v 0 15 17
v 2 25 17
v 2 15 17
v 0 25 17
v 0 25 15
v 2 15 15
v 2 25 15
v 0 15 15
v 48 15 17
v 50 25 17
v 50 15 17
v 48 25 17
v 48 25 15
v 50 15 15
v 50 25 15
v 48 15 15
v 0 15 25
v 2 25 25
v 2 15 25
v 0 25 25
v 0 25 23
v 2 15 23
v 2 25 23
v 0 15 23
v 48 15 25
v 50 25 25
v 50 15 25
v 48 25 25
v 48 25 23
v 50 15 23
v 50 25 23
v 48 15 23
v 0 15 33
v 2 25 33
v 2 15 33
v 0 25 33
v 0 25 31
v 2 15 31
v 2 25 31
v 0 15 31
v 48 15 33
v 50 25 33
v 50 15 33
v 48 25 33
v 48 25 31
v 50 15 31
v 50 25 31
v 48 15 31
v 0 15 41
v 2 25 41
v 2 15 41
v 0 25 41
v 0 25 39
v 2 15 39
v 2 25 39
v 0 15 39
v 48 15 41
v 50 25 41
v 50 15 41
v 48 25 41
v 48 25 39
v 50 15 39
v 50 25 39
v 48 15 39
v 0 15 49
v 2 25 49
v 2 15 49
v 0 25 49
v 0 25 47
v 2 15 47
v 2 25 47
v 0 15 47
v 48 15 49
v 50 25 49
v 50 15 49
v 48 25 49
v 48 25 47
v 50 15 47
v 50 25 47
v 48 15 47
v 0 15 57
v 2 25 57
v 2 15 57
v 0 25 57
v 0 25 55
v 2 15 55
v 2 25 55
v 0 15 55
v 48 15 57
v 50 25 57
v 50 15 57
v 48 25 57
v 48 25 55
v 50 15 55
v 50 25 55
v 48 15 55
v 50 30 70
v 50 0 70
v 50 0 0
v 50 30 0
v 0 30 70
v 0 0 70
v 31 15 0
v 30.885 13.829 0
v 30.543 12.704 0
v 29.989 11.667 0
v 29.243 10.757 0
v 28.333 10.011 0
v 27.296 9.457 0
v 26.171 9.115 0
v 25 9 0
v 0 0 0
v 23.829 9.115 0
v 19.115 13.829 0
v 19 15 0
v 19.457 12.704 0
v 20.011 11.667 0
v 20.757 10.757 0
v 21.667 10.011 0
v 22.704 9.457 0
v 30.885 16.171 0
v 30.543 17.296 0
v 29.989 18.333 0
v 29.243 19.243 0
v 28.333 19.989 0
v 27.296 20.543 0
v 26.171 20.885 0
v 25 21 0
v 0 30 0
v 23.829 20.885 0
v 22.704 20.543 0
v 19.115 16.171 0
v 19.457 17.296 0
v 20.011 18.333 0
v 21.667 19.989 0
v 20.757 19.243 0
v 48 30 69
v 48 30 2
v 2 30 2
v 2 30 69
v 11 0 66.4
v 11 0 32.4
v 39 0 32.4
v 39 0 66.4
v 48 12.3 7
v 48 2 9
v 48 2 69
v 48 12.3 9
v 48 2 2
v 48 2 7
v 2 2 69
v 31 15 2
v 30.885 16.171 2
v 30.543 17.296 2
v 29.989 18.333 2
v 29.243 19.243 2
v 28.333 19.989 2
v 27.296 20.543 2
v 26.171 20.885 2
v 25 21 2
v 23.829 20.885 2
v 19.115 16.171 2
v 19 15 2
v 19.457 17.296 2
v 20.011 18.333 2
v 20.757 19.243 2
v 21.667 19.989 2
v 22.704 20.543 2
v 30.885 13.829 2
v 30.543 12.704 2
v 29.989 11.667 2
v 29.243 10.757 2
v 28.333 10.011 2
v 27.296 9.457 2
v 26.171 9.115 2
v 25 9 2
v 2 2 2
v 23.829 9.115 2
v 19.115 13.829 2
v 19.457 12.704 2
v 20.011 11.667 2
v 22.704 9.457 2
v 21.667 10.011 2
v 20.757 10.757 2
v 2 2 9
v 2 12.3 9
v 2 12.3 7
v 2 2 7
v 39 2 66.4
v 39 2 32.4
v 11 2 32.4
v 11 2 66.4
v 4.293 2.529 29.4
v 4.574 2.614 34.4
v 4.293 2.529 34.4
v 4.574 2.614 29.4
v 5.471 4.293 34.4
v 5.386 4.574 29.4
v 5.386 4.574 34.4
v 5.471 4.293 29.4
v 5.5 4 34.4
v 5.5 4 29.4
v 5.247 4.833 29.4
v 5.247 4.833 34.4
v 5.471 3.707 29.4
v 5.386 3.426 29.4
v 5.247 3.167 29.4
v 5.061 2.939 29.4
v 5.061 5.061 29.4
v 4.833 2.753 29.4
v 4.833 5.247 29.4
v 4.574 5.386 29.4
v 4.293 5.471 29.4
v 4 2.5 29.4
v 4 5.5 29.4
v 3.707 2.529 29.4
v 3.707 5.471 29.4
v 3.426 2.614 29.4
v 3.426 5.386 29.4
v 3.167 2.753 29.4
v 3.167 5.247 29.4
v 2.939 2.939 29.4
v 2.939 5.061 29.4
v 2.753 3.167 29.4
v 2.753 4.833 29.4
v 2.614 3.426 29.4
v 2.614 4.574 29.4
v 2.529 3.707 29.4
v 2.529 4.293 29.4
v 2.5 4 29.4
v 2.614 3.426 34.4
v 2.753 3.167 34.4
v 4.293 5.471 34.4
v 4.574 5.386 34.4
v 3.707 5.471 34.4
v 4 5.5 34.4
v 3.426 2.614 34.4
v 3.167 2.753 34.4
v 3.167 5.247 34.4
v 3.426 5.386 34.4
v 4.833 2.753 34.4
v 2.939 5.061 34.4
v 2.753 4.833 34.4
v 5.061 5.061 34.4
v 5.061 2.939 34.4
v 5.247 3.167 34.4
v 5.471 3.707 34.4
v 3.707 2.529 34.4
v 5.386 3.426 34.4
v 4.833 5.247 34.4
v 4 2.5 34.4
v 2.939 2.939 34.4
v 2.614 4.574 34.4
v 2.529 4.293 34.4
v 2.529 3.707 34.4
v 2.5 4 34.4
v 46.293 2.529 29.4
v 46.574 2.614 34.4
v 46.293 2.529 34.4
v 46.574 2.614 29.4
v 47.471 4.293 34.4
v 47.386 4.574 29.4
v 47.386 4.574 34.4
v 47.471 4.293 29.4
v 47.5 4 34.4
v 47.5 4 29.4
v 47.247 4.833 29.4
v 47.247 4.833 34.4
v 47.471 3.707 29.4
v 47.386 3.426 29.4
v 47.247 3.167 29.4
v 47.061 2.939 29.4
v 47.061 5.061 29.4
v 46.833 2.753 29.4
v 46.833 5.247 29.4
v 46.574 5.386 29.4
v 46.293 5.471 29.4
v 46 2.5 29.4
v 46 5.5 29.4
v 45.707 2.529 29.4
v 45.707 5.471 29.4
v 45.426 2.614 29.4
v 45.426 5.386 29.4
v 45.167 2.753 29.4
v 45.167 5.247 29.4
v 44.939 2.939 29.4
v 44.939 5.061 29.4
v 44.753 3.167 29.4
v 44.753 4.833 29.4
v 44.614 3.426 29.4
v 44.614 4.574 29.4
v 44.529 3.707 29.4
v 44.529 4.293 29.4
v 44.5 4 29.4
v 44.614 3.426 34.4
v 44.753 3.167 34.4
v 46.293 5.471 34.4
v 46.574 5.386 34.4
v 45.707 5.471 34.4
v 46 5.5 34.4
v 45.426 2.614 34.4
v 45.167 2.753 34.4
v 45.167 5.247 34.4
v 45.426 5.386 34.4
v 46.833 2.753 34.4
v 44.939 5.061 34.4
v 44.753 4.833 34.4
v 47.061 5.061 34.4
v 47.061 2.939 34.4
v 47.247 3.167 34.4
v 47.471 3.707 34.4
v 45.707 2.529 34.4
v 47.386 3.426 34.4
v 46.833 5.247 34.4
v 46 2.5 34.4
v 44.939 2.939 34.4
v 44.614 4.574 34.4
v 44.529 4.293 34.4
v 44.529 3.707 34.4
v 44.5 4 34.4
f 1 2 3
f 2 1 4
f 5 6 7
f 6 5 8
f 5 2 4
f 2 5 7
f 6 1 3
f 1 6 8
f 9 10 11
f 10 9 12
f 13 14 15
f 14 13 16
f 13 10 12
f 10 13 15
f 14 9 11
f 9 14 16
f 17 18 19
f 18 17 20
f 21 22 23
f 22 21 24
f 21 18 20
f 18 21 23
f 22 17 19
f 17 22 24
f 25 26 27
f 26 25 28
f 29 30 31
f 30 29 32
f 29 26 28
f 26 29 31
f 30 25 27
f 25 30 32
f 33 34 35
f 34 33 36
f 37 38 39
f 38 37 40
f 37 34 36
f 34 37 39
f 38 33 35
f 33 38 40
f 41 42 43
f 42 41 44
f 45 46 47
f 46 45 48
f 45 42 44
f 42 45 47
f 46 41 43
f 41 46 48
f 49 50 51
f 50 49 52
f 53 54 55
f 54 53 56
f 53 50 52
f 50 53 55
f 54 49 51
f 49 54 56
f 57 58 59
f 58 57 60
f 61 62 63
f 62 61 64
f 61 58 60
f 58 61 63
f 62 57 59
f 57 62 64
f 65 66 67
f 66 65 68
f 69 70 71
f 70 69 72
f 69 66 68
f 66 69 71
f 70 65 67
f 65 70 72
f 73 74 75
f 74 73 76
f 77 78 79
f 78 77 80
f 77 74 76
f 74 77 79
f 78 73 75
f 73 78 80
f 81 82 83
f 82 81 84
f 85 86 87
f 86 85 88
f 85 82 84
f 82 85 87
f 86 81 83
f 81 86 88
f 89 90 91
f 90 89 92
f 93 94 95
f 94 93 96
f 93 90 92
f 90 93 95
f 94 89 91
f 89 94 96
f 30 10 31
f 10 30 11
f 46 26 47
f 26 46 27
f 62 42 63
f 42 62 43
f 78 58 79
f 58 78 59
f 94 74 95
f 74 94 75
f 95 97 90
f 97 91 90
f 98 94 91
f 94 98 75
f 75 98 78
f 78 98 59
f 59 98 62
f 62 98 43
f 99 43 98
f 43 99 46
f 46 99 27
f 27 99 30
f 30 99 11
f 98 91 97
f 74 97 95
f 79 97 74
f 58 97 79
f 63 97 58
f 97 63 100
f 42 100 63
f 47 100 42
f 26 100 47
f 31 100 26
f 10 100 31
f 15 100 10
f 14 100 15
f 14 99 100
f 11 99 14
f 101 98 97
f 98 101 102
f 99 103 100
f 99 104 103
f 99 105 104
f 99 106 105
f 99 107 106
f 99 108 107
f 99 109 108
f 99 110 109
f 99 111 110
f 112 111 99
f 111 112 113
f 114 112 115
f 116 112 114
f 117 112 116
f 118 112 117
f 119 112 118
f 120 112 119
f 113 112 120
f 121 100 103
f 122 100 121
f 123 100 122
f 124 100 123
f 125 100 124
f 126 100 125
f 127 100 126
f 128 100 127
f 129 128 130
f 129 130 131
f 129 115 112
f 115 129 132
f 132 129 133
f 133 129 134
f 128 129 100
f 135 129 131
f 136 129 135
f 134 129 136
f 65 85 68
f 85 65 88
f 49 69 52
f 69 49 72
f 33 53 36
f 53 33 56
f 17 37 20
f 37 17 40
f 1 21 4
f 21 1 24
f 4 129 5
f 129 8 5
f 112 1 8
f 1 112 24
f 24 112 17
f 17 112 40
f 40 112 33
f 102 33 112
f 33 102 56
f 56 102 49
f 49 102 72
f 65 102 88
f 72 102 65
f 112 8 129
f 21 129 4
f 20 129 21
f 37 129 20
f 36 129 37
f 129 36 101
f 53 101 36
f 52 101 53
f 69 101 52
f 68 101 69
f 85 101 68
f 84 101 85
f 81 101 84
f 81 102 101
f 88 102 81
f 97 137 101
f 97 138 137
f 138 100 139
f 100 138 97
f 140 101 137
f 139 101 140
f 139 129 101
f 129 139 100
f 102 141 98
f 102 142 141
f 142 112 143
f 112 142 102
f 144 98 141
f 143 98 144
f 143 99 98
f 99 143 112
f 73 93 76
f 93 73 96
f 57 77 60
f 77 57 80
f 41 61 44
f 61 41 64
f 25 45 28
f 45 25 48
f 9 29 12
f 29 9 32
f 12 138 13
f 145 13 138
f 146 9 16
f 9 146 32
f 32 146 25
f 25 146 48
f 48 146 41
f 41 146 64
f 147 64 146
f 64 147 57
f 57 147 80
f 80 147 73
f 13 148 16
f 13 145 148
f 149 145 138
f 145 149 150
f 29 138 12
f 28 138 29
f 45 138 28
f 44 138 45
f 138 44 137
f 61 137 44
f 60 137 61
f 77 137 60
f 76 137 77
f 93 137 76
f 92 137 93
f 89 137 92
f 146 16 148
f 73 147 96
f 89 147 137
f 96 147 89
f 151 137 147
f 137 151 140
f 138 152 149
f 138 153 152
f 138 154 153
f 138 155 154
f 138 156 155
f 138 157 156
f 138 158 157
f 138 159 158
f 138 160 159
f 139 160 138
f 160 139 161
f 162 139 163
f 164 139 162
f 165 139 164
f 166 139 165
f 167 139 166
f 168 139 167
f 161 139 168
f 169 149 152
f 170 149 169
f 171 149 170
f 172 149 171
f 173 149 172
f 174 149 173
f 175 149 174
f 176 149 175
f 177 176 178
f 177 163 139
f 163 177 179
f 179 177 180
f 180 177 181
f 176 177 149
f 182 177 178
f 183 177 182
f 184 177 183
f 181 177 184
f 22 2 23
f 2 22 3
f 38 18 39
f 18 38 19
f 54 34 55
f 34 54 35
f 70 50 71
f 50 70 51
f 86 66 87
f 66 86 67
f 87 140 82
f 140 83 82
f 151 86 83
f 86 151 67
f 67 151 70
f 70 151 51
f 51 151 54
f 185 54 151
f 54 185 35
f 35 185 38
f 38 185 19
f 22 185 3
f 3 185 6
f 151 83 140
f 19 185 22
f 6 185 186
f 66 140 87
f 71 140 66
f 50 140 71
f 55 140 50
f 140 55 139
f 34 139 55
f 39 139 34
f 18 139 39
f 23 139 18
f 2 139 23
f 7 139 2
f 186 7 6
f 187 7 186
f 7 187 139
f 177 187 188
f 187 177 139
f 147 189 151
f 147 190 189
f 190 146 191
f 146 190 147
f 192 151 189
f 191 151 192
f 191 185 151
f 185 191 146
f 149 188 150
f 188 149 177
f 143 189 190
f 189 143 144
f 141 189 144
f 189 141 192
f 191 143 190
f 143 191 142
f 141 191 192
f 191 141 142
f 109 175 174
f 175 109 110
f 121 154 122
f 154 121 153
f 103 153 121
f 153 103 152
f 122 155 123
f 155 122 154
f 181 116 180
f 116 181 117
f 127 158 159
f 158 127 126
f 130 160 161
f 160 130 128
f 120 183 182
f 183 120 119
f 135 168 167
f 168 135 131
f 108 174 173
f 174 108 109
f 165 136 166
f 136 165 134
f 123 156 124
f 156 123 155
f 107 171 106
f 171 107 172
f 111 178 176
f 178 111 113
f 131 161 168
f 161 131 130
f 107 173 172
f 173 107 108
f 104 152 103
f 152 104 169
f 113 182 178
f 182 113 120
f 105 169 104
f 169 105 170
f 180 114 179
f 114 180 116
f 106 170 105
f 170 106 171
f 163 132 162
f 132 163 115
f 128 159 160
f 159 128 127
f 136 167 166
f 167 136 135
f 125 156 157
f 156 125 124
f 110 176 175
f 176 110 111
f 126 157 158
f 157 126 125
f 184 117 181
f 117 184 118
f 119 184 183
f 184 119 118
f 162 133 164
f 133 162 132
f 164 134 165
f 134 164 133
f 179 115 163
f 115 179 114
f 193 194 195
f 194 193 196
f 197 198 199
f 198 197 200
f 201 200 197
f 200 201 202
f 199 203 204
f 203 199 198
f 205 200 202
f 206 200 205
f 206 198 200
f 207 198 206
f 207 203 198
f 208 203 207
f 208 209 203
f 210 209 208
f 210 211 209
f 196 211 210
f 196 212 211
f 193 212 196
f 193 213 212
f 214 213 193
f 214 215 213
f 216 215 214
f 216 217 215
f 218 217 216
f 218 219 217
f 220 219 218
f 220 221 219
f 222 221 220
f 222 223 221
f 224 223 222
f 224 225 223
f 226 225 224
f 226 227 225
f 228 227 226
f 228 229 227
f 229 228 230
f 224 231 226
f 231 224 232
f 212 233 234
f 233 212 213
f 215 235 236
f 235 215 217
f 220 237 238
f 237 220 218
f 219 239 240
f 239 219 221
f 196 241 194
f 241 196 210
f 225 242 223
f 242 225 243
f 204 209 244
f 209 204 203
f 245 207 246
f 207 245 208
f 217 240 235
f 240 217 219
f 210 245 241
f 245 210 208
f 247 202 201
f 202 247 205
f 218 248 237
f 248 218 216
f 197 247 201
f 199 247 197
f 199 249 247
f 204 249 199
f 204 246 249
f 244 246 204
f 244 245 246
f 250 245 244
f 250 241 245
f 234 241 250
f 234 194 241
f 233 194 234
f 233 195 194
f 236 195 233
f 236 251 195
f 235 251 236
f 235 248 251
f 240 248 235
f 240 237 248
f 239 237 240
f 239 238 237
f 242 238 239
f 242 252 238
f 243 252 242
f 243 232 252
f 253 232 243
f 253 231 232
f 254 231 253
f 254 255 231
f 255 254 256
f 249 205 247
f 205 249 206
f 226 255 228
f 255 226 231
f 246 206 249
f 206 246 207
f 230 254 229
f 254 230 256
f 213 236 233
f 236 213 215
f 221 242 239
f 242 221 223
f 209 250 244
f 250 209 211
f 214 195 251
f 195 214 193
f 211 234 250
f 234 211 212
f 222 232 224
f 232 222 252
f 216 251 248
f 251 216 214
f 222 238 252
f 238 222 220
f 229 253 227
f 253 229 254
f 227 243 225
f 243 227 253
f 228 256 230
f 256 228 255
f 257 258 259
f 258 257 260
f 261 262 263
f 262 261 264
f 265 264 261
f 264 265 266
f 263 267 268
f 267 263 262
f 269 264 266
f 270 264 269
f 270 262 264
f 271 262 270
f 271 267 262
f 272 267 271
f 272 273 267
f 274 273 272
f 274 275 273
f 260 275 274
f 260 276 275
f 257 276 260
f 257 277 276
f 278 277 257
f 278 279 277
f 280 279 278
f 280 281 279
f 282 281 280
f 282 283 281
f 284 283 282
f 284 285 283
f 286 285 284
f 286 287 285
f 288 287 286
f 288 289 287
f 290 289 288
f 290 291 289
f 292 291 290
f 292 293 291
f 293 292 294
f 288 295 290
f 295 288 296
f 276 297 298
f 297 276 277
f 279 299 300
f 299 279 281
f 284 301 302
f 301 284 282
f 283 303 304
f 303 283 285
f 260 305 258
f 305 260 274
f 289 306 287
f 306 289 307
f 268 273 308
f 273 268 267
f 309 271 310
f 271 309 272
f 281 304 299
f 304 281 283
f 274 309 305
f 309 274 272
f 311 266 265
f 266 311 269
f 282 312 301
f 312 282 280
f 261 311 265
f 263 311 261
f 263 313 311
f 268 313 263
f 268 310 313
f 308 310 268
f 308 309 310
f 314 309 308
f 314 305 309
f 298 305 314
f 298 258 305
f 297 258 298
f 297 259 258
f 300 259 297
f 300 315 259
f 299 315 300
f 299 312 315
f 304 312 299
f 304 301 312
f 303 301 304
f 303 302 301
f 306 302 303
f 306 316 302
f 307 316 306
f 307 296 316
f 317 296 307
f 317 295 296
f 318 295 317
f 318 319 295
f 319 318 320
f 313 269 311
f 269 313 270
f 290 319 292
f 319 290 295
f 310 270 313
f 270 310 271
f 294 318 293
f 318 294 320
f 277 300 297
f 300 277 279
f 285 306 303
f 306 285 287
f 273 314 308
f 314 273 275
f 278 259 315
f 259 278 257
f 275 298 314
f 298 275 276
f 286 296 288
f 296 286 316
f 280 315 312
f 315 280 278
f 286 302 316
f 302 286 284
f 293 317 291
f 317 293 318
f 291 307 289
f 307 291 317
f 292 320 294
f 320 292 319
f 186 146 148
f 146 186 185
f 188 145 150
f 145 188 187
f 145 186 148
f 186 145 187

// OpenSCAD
// Nightwatch Radar Wall Enclosure
// Houses LD2450 radar + CP2102 USB-UART adapter
// Designed for wall mounting with 45° downward tilt

/* [Main Dimensions] */
wall_thickness = 2;          // mm
outer_width = 50;            // mm
outer_height = 70;           // mm
outer_depth = 30;            // mm (at deepest point)
tilt_angle = 45;             // degrees - points radar down

/* [LD2450 Radar] */
radar_width = 24;            // mm
radar_height = 30;           // mm
radar_depth = 8;             // mm
radar_window_margin = 2;     // mm extra around radar

/* [CP2102 USB-UART] */
cp2102_width = 25;           // mm
cp2102_height = 15;          // mm
cp2102_depth = 5;            // mm

/* [Cable/Mounting] */
usb_cable_dia = 8;           // mm (micro USB cable)
usb_exit_dia = 12;           // mm (with strain relief space)
mount_hole_dia = 4;          // mm (for screws)
mount_hole_inset = 8;        // mm from edges

/* [Tolerances] */
fit_tolerance = 0.3;         // mm added to component pockets

/* [Rendering] */
$fn = 32;                    // circle smoothness

// Calculated values
inner_width = outer_width - (wall_thickness * 2);
inner_height = outer_height - (wall_thickness * 2);
inner_depth = outer_depth - wall_thickness;

radar_pocket_w = radar_width + fit_tolerance * 2;
radar_pocket_h = radar_height + fit_tolerance * 2;
radar_pocket_d = radar_depth + fit_tolerance;

cp2102_pocket_w = cp2102_width + fit_tolerance * 2;
cp2102_pocket_h = cp2102_height + fit_tolerance * 2;
cp2102_pocket_d = cp2102_depth + fit_tolerance + 3; // extra for USB port

// Main enclosure module
module enclosure_base() {
    difference() {
        // Outer shell
        cube([outer_width, outer_depth, outer_height]);

        // Inner cavity
        translate([wall_thickness, wall_thickness, wall_thickness])
            cube([inner_width, inner_depth, inner_height + 1]);

        // Radar window (front cutout)
        window_w = radar_width + radar_window_margin * 2;
        window_h = radar_height + radar_window_margin * 2;
        window_z = outer_height - wall_thickness - radar_pocket_h - 5;
        translate([(outer_width - window_w) / 2, -1, window_z])
            cube([window_w, wall_thickness + 2, window_h]);

        // USB cable exit hole (bottom)
        translate([outer_width / 2, outer_depth / 2, -1])
            cylinder(d=usb_exit_dia, h=wall_thickness + 2);

        // Mount holes (keyhole slots)
        // Top hole
        translate([outer_width / 2, outer_depth + 1, outer_height - mount_hole_inset])
            rotate([90, 0, 0])
                mount_keyhole();

        // Bottom hole
        translate([outer_width / 2, outer_depth + 1, mount_hole_inset + 10])
            rotate([90, 0, 0])
                mount_keyhole();

        // Ventilation slots (sides)
        for (z = [15 : 8 : 55]) {
            // Left side
            translate([-1, outer_depth / 2, z])
                cube([wall_thickness + 2, 10, 2]);
            // Right side
            translate([outer_width - wall_thickness - 1, outer_depth / 2, z])
                cube([wall_thickness + 2, 10, 2]);
        }
    }

    // Radar mounting posts
    radar_z = outer_height - wall_thickness - radar_pocket_h - 3;
    post_h = 5;

    // Corner posts to hold radar
    translate([wall_thickness + 2, wall_thickness + 2, radar_z - post_h])
        cylinder(d=3, h=post_h);
    translate([outer_width - wall_thickness - 2, wall_thickness + 2, radar_z - post_h])
        cylinder(d=3, h=post_h);

    // CP2102 mounting shelf
    shelf_z = wall_thickness + 5;
    shelf_depth = cp2102_pocket_d + 2;
    translate([wall_thickness, wall_thickness, shelf_z])
        cube([inner_width, shelf_depth, 2]);
}

// Keyhole mount slot
module mount_keyhole() {
    hull() {
        cylinder(d=mount_hole_dia, h=wall_thickness + 2);
        translate([0, -6, 0])
            cylinder(d=mount_hole_dia * 1.8, h=wall_thickness + 2);
    }
}

// Lid module
module enclosure_lid() {
    lid_thickness = wall_thickness;
    lip_depth = 3;
    lip_tolerance = 0.2;

    difference() {
        union() {
            // Main lid plate
            cube([outer_width, outer_depth, lid_thickness]);

            // Inner lip (fits inside enclosure)
            translate([wall_thickness + lip_tolerance,
                       wall_thickness + lip_tolerance,
                       lid_thickness])
                cube([inner_width - lip_tolerance * 2,
                      inner_depth - lip_tolerance * 2,
                      lip_depth]);
        }

        // Snap fit notches (cut into lip)
        for (x = [outer_width * 0.25, outer_width * 0.75]) {
            translate([x - 2, wall_thickness - 1, lid_thickness])
                cube([4, wall_thickness + 2, lip_depth + 1]);
        }
    }

    // Snap fit bumps on sides
    for (x = [outer_width * 0.25, outer_width * 0.75]) {
        translate([x, wall_thickness + lip_tolerance + 0.5, lid_thickness + lip_depth - 1])
            sphere(d=1.5);
    }
}

// Angled wall mount bracket (optional separate piece)
module wall_bracket() {
    bracket_width = outer_width + 10;
    bracket_height = 20;
    bracket_depth = 15;

    difference() {
        union() {
            // Flat wall plate
            cube([bracket_width, 3, bracket_height + outer_depth * sin(tilt_angle)]);

            // Angled support
            translate([0, 3, 0])
                rotate([tilt_angle, 0, 0])
                    cube([bracket_width, outer_depth + 5, 3]);
        }

        // Screw holes for wall
        translate([bracket_width * 0.2, -1, bracket_height / 2])
            rotate([-90, 0, 0])
                cylinder(d=4, h=5);
        translate([bracket_width * 0.8, -1, bracket_height / 2])
            rotate([-90, 0, 0])
                cylinder(d=4, h=5);
    }
}

// ---- RENDER SELECTION ----
// Uncomment the part you want to render/export

// Main enclosure base
enclosure_base();

// Lid (translate for viewing)
// translate([outer_width + 10, 0, 0]) enclosure_lid();

// Wall bracket (optional)
// translate([0, outer_depth + 20, 0]) wall_bracket();

// All parts for preview
// enclosure_base();
// translate([outer_width + 10, 0, 0]) enclosure_lid();
// translate([0, outer_depth + 20, 0]) wall_bracket();
